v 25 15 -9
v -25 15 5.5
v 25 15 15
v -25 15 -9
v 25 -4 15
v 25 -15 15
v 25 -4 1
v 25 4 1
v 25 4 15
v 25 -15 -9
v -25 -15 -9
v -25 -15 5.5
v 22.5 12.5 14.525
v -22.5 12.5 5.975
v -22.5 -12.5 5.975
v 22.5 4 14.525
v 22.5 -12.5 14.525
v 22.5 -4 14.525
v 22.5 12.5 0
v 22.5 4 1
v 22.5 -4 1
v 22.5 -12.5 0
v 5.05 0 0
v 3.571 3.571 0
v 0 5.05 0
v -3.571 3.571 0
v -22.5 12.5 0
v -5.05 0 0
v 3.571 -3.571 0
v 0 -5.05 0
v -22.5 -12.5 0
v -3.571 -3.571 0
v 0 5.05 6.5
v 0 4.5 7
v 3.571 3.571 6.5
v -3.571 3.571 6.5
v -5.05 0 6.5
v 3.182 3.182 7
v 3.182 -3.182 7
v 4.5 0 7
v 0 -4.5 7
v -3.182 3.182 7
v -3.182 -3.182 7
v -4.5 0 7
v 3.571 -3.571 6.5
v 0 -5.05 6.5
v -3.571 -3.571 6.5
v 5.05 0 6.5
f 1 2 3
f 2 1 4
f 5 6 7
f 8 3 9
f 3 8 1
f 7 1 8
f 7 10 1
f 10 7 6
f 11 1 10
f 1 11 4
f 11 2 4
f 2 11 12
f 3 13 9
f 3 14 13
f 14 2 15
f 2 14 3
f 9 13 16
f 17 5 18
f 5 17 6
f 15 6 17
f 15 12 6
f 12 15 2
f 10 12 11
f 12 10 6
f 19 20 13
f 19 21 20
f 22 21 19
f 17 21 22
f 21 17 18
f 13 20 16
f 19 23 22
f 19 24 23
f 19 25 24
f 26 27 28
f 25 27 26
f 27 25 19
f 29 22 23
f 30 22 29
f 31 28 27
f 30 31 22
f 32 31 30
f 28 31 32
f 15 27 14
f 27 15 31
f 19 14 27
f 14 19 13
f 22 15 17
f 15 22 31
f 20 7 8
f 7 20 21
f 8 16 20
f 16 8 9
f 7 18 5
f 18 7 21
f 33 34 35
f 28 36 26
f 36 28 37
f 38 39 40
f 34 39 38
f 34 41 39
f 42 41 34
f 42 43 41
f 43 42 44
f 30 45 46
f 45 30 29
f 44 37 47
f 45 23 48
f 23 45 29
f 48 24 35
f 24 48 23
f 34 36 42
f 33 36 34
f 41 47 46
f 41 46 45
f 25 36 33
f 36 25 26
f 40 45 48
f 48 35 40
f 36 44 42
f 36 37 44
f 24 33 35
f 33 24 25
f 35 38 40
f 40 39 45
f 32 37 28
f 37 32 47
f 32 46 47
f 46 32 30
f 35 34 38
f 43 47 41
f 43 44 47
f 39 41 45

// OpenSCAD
extraheight = 7;
difference(){
    union(){
        rotate([90]) translate([-25,-2])
        linear_extrude(30, center=true){
            polygon([[0,-extraheight],[50,-extraheight],[50,17], [0,7.5]]);
        }
    }
    translate([0,0,15])
        cube([45,25,30], center=true);
    
    translate([10,0,16])
        cube([45,8,30], center=true);
}

        hull(){
            cylinder(h=6.5, d=10.1, $fn=8);
            cylinder(h=7, d=9, $fn=8);
        }
